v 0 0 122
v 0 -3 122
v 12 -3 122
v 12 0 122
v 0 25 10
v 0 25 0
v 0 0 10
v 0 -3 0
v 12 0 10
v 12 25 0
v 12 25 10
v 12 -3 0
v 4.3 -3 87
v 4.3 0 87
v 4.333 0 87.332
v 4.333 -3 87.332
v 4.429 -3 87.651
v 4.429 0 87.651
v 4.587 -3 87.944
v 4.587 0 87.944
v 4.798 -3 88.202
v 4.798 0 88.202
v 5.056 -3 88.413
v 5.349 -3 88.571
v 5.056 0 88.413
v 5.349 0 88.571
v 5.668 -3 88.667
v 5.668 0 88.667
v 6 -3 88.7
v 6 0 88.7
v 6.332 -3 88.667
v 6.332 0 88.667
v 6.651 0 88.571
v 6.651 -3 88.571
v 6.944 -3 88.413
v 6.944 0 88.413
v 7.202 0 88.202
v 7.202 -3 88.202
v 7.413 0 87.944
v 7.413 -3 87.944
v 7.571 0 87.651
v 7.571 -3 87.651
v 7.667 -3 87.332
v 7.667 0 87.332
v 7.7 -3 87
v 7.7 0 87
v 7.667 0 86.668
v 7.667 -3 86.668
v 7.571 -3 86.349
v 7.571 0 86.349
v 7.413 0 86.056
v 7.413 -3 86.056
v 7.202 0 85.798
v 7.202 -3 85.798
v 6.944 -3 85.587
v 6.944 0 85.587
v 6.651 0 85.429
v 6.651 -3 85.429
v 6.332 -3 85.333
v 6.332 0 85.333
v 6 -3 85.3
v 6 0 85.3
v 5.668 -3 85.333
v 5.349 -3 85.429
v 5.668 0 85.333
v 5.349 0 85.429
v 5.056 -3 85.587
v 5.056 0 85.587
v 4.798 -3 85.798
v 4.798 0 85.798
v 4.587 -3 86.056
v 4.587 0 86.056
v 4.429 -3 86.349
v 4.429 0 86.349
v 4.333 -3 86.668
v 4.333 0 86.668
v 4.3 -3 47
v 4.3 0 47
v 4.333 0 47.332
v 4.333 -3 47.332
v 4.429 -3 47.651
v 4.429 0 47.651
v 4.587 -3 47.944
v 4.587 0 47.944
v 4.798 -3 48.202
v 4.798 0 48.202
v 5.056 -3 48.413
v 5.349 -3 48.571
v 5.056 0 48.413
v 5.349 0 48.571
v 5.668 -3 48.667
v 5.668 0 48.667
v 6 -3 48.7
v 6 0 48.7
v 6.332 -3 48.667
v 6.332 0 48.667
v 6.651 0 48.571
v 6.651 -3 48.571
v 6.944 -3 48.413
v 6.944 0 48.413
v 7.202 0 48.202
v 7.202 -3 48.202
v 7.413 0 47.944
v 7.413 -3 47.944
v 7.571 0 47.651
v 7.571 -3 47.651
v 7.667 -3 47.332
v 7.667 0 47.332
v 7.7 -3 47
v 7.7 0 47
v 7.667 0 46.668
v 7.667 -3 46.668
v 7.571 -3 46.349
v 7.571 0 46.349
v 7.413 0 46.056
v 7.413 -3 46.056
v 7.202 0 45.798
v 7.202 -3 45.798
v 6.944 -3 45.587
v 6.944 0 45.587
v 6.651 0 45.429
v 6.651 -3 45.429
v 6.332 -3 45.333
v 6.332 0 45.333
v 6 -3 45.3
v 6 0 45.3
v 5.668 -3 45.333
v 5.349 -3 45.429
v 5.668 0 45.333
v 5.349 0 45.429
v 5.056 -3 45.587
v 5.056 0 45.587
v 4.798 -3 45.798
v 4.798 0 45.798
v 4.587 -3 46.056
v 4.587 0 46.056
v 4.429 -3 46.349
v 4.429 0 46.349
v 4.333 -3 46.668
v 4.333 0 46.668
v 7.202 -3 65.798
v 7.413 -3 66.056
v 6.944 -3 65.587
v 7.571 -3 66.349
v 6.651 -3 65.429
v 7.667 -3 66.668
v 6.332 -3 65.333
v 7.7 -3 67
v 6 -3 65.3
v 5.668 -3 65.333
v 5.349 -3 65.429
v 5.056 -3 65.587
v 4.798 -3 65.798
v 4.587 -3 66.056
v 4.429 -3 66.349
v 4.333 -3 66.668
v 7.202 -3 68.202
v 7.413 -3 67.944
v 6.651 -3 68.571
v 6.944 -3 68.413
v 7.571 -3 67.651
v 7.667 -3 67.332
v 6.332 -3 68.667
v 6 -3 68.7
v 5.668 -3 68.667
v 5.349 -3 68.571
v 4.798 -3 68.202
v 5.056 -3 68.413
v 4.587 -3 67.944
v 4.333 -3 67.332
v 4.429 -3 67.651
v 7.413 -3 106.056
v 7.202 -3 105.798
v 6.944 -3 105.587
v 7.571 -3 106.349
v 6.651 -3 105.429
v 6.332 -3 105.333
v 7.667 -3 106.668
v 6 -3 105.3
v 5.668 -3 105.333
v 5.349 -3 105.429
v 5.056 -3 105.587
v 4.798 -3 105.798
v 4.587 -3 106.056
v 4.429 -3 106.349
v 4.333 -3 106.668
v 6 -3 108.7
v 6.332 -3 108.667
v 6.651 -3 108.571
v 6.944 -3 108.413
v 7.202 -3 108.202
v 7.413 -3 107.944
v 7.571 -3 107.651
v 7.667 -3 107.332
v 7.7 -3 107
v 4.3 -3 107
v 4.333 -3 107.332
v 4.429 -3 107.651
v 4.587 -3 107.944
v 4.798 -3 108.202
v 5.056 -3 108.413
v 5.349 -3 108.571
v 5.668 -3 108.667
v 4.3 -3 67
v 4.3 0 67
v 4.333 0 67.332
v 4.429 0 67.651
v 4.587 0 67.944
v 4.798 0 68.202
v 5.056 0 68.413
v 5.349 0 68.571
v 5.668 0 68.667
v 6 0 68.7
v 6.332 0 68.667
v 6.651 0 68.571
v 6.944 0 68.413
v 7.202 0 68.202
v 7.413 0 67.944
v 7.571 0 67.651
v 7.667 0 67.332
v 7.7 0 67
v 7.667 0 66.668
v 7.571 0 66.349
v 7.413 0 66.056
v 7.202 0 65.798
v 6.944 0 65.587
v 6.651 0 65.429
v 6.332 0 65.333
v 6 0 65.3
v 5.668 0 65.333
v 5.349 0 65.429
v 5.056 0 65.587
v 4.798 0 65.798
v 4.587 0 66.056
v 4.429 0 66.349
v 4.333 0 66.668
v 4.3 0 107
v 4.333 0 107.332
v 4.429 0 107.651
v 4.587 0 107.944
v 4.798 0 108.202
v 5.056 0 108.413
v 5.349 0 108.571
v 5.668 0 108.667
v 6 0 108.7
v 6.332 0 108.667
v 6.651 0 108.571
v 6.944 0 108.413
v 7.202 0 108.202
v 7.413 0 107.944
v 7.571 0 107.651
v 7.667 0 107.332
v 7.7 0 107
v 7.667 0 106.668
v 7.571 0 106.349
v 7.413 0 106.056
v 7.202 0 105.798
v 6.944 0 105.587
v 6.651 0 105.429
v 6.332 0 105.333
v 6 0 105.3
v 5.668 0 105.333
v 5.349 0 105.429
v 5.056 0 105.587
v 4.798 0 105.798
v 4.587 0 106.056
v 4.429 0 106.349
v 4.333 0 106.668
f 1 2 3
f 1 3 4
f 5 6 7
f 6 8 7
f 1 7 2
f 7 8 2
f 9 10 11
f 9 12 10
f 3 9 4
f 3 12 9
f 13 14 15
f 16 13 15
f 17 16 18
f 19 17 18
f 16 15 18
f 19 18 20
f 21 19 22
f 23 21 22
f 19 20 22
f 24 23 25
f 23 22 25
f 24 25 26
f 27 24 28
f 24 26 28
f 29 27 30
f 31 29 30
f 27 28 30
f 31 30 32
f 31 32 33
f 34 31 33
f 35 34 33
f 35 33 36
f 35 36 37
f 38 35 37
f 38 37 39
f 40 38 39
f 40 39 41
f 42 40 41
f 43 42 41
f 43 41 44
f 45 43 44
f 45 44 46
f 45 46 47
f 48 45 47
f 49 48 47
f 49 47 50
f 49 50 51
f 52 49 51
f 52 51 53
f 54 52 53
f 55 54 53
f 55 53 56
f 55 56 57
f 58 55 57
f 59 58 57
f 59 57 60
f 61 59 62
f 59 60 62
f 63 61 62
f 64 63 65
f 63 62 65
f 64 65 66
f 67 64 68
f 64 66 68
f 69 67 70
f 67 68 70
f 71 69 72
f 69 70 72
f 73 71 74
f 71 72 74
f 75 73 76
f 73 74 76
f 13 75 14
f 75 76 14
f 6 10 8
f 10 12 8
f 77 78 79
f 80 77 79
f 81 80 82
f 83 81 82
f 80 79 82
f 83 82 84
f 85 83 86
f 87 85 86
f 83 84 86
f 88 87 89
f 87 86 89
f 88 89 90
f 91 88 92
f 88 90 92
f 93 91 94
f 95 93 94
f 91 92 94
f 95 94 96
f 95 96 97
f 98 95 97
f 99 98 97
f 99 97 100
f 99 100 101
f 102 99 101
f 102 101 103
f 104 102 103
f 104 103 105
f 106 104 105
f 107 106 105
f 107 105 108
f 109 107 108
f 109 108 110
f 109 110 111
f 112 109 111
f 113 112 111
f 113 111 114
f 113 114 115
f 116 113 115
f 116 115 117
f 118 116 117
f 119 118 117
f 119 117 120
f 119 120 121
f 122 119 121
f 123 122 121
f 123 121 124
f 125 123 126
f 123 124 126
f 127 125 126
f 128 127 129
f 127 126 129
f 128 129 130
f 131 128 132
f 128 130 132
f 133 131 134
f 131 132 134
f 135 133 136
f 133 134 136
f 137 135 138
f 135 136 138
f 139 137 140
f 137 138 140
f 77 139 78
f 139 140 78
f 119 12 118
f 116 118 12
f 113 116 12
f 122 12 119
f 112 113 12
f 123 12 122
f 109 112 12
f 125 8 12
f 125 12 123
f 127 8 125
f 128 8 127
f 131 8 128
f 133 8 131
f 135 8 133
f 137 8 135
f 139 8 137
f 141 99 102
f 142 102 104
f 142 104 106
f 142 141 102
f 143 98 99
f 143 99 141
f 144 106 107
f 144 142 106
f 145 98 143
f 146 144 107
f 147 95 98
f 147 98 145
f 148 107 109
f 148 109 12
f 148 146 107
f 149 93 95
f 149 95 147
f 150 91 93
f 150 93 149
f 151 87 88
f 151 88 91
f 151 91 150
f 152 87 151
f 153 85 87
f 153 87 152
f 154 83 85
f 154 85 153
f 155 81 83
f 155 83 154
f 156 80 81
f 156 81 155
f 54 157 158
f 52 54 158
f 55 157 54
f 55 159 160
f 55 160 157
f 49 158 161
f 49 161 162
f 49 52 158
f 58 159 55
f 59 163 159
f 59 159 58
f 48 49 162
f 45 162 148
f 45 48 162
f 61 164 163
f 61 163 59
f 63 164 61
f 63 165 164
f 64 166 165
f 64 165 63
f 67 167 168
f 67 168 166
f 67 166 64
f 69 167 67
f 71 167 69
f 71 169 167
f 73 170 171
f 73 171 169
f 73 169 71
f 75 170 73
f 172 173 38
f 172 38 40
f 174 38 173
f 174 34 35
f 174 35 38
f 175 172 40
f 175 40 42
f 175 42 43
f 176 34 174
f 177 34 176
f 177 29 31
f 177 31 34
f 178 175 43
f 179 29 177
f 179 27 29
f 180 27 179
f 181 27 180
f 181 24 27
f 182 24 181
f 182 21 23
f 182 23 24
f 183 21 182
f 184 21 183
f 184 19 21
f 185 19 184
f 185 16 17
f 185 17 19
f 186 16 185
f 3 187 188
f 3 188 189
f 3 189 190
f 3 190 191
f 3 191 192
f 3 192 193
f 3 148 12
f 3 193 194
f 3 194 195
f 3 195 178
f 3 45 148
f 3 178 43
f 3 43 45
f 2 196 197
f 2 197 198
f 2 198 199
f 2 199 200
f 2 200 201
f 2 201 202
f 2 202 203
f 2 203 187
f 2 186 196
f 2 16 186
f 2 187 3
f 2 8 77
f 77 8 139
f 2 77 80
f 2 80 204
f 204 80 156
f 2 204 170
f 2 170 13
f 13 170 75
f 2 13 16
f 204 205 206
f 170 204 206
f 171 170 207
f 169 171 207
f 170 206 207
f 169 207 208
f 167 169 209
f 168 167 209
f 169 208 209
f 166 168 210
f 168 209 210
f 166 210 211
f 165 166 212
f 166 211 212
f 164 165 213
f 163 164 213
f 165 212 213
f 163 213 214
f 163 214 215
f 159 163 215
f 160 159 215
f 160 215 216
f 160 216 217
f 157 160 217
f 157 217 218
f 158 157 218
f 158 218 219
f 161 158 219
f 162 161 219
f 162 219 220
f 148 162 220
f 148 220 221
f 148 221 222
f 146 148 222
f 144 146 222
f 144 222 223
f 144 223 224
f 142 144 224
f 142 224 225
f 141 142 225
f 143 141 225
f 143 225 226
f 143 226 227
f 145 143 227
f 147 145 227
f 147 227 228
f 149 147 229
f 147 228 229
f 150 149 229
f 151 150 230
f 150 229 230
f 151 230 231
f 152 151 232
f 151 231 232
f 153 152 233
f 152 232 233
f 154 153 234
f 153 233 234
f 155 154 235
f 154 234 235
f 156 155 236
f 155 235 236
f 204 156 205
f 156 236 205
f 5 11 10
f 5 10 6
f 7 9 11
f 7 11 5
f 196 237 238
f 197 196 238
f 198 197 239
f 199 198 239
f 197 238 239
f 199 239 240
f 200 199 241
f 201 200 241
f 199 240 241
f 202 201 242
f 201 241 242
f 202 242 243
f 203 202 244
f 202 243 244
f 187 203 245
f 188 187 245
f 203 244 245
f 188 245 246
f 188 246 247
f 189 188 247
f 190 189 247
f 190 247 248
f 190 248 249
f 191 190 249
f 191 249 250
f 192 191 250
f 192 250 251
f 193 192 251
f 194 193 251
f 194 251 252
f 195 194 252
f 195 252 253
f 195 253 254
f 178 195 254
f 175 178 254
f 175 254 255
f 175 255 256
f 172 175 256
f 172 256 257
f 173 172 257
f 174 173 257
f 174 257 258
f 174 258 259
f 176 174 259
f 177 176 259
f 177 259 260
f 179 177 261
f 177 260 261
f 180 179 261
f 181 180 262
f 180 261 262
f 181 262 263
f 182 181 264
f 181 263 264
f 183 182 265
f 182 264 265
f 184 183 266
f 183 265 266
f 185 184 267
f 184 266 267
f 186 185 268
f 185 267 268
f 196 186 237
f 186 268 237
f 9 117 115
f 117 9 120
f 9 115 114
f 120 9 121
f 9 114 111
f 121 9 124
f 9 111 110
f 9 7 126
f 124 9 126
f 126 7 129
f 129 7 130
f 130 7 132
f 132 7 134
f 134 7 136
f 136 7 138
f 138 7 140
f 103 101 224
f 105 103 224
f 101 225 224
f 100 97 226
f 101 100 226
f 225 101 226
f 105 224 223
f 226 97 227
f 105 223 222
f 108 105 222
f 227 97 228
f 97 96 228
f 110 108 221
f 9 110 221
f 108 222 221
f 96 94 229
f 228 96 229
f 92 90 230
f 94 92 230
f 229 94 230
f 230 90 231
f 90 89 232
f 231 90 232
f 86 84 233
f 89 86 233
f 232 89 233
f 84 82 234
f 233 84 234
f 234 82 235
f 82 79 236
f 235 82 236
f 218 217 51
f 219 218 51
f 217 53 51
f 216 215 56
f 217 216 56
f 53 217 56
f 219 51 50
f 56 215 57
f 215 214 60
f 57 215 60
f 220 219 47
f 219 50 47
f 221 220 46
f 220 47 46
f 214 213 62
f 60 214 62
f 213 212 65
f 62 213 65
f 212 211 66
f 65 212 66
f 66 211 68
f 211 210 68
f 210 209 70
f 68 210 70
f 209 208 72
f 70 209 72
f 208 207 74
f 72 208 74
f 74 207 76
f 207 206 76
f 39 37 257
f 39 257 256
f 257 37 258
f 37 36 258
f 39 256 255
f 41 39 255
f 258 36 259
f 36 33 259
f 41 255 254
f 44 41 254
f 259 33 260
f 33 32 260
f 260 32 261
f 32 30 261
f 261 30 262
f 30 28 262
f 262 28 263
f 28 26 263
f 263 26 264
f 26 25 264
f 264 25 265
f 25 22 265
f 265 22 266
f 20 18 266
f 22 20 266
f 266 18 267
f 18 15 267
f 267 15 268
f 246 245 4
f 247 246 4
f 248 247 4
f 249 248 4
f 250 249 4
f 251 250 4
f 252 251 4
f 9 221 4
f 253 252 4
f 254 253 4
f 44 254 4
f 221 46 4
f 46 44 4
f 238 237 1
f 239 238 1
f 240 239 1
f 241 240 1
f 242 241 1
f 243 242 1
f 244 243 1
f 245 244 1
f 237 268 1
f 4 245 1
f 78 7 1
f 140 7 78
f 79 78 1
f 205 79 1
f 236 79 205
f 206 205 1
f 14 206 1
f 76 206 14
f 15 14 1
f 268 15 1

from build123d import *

# Parameters (mm, degrees)
F0_W     = 3
F0_H     = 122
F1_DEPTH = 12
F2_W     = 12
F2_H     = 10
F3_DEPTH = 25
F4_R     = 1.7
F5_DEPTH = 3.001


with BuildPart() as f1:
    # F0 (on Right) → F1 (new body)
    with BuildSketch(Plane.YZ):
        with Locations((-1.5, 61)):
            Rectangle(F0_W, F0_H)
    extrude(amount=F1_DEPTH)

    # F2 (on face) → F3 (join)
    with BuildSketch(Plane(origin=(0, 0, 0), x_dir=(-1, 0, 0), z_dir=(0, 1, 0))):
        with Locations((-6, 5)):
            Rectangle(F2_W, F2_H)
    extrude(amount=F3_DEPTH)

    # F4 (on face) → F5 (cut, through all)
    with BuildSketch(Plane(origin=(0, 0, 0), x_dir=(-1, 0, 0), z_dir=(0, 1, 0))):
        with Locations((-6, 107)):
            Circle(F4_R)
        with Locations((-6, 87)):
            Circle(F4_R)
        with Locations((-6, 67)):
            Circle(F4_R)
        with Locations((-6, 47)):
            Circle(F4_R)
    extrude(amount=-F5_DEPTH, mode=Mode.SUBTRACT)


solid = f1.part
